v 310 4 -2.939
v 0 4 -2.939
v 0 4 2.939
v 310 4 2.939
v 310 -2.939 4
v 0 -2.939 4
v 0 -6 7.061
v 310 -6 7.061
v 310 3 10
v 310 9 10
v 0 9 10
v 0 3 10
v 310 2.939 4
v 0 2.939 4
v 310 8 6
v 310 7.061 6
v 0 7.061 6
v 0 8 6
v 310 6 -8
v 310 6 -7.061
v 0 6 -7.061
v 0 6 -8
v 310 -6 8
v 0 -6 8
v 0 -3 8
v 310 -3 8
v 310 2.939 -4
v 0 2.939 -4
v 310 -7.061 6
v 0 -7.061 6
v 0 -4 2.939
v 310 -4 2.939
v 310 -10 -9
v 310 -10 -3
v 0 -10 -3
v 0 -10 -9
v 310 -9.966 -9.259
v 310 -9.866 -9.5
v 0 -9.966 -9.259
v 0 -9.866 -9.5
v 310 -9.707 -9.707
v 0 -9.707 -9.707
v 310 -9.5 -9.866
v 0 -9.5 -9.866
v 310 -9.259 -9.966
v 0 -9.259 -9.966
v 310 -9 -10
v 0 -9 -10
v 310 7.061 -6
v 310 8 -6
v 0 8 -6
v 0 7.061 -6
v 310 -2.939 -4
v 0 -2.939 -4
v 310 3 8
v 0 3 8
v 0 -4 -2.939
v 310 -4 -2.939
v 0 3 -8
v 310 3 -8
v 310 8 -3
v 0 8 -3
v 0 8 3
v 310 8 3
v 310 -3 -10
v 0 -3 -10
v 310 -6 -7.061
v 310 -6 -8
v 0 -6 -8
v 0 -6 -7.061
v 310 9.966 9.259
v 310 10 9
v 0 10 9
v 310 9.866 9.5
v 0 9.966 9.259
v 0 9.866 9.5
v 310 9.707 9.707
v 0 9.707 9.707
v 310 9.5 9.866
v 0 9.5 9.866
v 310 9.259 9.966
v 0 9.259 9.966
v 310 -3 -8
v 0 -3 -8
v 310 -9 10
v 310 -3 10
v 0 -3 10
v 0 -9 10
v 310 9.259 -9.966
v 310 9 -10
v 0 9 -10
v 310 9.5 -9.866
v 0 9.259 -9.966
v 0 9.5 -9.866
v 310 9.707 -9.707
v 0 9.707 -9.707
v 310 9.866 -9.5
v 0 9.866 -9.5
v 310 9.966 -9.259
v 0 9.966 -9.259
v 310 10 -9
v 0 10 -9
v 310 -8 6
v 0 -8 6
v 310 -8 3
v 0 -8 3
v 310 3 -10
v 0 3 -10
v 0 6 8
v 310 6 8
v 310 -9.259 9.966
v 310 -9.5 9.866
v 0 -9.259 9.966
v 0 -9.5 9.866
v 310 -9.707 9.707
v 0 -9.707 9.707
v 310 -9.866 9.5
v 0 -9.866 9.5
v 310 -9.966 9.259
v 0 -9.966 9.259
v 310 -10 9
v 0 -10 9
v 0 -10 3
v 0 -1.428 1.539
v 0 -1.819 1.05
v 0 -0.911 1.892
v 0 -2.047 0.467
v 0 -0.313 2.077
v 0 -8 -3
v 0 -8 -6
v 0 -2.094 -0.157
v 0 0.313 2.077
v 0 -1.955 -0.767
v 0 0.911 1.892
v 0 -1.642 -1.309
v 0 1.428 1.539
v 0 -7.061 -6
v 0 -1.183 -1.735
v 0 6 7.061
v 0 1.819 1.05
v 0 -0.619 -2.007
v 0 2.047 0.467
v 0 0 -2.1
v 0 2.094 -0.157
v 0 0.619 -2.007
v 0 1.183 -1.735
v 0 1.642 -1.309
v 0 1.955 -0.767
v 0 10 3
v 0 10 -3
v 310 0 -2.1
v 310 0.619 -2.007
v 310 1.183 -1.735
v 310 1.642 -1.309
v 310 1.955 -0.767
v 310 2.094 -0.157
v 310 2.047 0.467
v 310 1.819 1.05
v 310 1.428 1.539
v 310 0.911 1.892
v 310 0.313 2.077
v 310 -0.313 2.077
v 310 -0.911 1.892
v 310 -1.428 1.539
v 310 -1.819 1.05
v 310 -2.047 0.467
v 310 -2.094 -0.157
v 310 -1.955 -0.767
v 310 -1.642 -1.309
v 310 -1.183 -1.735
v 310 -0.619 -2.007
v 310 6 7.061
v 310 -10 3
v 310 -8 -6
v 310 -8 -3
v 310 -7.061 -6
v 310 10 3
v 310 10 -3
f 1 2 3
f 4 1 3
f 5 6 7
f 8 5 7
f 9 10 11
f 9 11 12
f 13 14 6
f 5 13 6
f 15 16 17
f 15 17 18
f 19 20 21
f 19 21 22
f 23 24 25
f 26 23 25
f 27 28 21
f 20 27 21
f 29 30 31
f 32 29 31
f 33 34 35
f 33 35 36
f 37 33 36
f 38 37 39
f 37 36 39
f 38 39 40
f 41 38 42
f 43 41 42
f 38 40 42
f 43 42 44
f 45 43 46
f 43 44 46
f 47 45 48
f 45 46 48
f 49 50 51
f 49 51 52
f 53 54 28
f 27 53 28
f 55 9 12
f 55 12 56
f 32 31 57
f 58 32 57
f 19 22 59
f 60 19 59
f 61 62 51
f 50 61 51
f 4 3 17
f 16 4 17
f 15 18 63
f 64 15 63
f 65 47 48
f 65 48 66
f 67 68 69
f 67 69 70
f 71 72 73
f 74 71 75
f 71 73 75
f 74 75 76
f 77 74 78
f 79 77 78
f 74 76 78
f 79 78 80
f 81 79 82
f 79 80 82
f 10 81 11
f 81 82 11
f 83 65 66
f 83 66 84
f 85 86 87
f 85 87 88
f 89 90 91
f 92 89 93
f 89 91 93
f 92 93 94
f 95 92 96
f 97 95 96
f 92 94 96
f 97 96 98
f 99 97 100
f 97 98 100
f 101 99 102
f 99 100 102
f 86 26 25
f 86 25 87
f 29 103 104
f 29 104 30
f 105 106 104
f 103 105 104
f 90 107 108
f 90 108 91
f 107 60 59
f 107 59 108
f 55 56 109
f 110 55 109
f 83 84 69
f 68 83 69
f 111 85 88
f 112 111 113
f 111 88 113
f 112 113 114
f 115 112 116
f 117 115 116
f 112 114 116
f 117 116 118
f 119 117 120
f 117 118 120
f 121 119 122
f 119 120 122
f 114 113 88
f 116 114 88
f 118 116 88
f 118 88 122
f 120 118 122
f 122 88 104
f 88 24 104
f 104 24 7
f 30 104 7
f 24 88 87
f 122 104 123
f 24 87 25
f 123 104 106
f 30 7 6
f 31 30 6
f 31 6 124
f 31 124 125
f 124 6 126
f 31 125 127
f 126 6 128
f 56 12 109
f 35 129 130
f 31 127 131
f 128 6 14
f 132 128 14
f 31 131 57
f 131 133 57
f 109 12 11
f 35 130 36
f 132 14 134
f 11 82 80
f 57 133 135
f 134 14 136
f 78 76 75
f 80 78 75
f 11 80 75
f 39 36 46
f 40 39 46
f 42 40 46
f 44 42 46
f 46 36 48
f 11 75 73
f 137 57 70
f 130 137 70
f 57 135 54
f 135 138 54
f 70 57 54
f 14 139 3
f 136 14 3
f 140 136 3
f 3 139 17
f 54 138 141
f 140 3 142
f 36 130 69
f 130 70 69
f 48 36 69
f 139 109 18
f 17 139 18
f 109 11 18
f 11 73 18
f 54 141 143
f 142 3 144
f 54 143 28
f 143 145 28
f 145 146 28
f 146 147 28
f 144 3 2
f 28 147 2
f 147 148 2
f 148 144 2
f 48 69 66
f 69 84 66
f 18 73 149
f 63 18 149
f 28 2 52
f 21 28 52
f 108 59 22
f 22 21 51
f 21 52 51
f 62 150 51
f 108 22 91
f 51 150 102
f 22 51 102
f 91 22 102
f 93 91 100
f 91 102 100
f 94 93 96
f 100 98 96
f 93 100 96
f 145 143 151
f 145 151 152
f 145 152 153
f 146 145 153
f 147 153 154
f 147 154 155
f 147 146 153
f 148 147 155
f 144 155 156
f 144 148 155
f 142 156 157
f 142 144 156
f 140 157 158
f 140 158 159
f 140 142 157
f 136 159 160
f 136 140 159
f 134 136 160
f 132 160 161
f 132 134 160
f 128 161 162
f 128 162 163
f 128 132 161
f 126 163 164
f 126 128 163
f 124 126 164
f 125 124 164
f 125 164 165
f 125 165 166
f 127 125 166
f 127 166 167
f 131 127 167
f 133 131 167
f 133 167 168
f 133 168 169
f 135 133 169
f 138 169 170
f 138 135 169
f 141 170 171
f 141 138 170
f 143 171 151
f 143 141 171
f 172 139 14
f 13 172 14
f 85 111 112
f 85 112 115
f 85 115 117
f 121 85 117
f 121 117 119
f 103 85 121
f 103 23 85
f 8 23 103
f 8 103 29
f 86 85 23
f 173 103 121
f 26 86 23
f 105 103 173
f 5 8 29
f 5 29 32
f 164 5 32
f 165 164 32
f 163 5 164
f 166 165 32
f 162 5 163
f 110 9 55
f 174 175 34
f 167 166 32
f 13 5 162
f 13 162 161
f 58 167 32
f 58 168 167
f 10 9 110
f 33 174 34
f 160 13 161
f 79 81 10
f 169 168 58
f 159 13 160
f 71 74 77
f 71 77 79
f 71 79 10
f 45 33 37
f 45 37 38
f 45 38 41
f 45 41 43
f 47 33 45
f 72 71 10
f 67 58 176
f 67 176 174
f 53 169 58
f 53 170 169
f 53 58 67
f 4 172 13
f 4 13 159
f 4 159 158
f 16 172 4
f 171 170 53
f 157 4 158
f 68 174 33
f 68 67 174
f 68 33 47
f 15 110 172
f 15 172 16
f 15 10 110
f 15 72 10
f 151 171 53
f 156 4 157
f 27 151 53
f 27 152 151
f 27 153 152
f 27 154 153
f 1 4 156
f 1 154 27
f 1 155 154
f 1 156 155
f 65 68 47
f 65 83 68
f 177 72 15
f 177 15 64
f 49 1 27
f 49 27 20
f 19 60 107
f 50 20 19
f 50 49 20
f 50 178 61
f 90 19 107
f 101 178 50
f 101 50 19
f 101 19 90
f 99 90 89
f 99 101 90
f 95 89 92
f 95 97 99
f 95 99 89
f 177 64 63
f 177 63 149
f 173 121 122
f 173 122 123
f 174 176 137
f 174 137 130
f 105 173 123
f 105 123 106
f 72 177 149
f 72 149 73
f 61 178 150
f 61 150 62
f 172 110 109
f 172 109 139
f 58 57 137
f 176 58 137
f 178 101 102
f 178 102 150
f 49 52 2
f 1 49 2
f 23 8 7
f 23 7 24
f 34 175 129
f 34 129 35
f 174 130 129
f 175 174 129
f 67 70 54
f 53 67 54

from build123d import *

# Parameters (mm, degrees)
SKETCH1_R           = 2.1
BOSS_EXTRUDE1_DEPTH = 310


with BuildPart() as part:
    # Sketch1 → Boss-Extrude1 (new body)
    with BuildSketch(Plane(origin=(0, 0, 0), x_dir=(0, 0, -1), z_dir=(1, 0, 0))):
        with BuildLine():
            Line((-10, 9), (-10, 3))
            Line((-10, 3), (-8, 3))
            Line((-8, 3), (-8, 6))
            Line((-8, 6), (-7.060660172, 6))
            Line((-7.060660172, 6), (-4, 2.939339828))
            Line((-4, 2.939339828), (-4, -2.939339828))
            Line((-4, -2.939339828), (-7.060660172, -6))
            Line((-7.060660172, -6), (-8, -6))
            Line((-8, -6), (-8, -3))
            Line((-8, -3), (-10, -3))
            Line((-10, -3), (-10, -9))
            ThreePointArc((-10, -9), (-9.707106781, -9.707106781), (-9, -10))
            Line((-9, -10), (-3, -10))
            Line((-3, -10), (-3, -8))
            Line((-3, -8), (-6, -8))
            Line((-6, -8), (-6, -7.060660172))
            Line((-6, -7.060660172), (-2.939339828, -4))
            Line((-2.939339828, -4), (2.939339828, -4))
            Line((2.939339828, -4), (6, -7.060660172))
            Line((6, -7.060660172), (6, -8))
            Line((6, -8), (3, -8))
            Line((3, -8), (3, -10))
            Line((3, -10), (9, -10))
            ThreePointArc((9, -10), (9.707106781, -9.707106781), (10, -9))
            Line((10, -9), (10, -3))
            Line((10, -3), (8, -3))
            Line((8, -3), (8, -6))
            Line((8, -6), (7.060660172, -6))
            Line((7.060660172, -6), (4, -2.939339828))
            Line((4, -2.939339828), (4, 2.939339828))
            Line((4, 2.939339828), (7.060660172, 6))
            Line((7.060660172, 6), (8, 6))
            Line((8, 6), (8, 3))
            Line((8, 3), (10, 3))
            Line((10, 3), (10, 9))
            ThreePointArc((10, 9), (9.707106781, 9.707106781), (9, 10))
            Line((9, 10), (3, 10))
            Line((3, 10), (3, 8))
            Line((3, 8), (6, 8))
            Line((6, 8), (6, 7.060660172))
            Line((6, 7.060660172), (2.939339828, 4))
            Line((2.939339828, 4), (-2.939339828, 4))
            Line((-2.939339828, 4), (-6, 7.060660172))
            Line((-6, 7.060660172), (-6, 8))
            Line((-6, 8), (-3, 8))
            Line((-3, 8), (-3, 10))
            Line((-3, 10), (-9, 10))
            ThreePointArc((-9, 10), (-9.707106781, 9.707106781), (-10, 9))
        make_face()
        Circle(SKETCH1_R, mode=Mode.SUBTRACT)
    extrude(amount=BOSS_EXTRUDE1_DEPTH)


solid = part.part
